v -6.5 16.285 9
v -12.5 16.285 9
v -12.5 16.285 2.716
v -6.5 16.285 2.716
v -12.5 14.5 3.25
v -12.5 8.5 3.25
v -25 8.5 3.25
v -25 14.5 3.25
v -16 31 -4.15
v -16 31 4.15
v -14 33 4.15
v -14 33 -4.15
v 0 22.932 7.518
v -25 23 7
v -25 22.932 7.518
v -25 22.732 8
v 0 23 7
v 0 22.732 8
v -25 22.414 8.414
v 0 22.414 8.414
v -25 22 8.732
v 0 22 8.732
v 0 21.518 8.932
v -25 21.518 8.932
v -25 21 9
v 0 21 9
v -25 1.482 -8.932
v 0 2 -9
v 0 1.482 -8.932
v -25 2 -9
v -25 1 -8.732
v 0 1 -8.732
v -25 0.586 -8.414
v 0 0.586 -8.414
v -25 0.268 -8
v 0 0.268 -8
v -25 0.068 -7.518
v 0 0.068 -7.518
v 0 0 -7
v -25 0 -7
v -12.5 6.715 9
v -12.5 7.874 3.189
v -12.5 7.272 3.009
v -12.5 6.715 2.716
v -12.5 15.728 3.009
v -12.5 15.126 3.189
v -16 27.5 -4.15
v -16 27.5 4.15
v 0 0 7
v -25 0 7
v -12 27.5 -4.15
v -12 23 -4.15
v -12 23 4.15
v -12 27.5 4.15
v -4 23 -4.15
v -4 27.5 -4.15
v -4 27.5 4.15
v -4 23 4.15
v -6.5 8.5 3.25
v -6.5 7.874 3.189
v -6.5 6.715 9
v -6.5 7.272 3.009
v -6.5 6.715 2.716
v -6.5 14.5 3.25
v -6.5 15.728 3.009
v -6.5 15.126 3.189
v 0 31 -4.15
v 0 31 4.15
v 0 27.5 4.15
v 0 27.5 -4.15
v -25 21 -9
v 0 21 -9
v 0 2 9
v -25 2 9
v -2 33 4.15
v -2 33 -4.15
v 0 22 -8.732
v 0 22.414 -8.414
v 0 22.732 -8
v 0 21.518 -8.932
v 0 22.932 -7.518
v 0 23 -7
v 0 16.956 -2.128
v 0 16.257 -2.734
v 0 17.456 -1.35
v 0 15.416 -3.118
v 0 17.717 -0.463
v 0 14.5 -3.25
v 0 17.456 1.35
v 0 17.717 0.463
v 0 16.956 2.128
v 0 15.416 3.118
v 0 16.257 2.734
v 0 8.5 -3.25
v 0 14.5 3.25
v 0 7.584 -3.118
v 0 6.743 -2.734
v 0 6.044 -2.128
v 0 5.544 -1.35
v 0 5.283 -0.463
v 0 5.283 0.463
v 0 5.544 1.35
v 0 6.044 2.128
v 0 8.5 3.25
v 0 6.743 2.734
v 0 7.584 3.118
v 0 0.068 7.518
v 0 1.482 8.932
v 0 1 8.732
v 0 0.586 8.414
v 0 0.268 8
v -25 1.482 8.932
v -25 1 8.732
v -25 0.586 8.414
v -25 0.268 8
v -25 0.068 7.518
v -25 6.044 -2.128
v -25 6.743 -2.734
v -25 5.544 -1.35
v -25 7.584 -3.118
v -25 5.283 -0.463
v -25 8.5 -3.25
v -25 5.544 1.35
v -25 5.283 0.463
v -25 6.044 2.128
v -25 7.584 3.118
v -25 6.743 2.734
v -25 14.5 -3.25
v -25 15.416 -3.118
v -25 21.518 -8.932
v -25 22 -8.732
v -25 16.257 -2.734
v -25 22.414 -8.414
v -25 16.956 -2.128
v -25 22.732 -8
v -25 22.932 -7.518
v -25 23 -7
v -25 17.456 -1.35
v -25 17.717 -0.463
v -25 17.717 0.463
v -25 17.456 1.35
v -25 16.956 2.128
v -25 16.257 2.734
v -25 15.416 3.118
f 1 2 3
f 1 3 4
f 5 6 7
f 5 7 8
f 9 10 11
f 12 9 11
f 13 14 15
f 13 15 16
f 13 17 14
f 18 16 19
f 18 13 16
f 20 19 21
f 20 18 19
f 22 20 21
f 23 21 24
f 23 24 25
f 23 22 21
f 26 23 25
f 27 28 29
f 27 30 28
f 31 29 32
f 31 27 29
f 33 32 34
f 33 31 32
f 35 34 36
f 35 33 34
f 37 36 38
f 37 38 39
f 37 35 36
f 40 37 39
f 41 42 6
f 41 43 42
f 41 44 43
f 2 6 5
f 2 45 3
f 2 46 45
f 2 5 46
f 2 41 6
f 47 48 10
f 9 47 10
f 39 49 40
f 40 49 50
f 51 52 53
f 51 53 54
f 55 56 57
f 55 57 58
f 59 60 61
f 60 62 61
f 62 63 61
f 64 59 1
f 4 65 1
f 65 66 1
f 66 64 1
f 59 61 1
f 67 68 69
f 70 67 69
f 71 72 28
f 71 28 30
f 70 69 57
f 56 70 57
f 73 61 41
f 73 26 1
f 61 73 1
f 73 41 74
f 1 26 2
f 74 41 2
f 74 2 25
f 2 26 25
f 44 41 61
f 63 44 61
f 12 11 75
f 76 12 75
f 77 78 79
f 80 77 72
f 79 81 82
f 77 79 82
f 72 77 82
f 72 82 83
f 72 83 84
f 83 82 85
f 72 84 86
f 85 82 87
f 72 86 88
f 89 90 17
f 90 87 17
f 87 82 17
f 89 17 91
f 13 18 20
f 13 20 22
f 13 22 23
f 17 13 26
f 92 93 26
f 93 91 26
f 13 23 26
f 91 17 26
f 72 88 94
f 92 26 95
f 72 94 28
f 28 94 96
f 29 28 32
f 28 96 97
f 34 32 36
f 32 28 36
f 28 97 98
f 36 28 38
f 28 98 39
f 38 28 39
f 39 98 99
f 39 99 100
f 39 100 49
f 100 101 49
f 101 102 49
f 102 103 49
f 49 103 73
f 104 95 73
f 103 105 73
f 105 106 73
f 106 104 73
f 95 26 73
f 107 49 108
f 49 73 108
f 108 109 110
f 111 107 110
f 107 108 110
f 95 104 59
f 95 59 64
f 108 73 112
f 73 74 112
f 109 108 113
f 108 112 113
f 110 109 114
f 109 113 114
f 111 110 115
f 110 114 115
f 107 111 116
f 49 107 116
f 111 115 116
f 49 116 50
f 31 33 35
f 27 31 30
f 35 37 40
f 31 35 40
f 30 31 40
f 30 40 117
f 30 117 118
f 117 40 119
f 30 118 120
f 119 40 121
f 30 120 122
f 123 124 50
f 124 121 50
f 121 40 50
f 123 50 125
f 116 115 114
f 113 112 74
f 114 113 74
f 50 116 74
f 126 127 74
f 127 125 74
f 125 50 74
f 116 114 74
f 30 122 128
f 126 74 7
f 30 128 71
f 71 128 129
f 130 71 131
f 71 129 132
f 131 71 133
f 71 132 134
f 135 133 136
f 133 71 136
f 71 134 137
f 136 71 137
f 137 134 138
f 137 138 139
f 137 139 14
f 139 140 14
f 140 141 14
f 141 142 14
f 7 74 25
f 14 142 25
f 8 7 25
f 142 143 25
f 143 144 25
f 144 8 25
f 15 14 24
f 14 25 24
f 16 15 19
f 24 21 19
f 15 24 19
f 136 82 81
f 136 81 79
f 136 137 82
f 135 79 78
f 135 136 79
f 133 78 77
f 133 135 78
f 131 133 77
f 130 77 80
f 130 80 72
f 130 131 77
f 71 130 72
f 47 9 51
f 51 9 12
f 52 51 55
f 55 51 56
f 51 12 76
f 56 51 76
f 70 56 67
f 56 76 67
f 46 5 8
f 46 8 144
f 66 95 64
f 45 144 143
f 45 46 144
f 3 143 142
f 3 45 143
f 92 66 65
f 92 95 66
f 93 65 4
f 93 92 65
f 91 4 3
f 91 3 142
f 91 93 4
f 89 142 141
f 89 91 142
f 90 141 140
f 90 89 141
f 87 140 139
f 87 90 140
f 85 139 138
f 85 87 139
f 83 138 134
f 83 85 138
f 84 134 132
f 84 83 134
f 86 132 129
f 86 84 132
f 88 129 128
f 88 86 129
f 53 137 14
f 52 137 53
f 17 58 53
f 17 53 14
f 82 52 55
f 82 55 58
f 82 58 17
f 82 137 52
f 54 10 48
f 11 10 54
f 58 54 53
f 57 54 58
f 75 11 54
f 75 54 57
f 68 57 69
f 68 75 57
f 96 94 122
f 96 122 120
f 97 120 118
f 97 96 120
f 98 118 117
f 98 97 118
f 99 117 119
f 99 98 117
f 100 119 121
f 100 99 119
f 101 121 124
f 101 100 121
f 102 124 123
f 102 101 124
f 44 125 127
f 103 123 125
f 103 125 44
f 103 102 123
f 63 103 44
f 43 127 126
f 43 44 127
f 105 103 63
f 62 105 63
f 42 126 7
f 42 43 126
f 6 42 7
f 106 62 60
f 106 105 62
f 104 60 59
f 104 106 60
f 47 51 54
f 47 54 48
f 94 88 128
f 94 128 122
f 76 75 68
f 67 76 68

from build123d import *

# Parameters (mm, degrees)
EXTRUDE_1_DEPTH     = 9
CUT_EXTRUDE_1_REACH = 44.367
SKETCH_3_W          = 19.10949688
SKETCH_3_H          = 7.850581447
SKETCH_3_W_2        = 21.646823843
SKETCH_3_H_2        = 9.928676536
CUT_EXTRUDE_2_DEPTH = 43.367440329
SKETCH_5_W          = 6
SKETCH_5_H          = 9.57
CUT_EXTRUDE_3_DEPTH = 10
FILLET_1_R          = 2


with BuildPart() as part:
    # 草图1 → 凸台-拉伸1 (new, symmetric)
    with BuildSketch(Plane.XY):
        Polygon((-14, 33), (-2, 33), (0, 31), (0, 27.5), (-4, 27.5), (-4, 23), (0, 23), (0, 0), (-25, 0), (-25, 23), (-12, 23), (-12, 27.5), (-16, 27.5), (-16, 31), align=None)
    extrude(amount=EXTRUDE_1_DEPTH, both=True)

    # 切除-拉伸1: up to this face of the body (flat: up to its plane)
    cut_extrude_1_end = Plane(part.part.faces().sort_by_distance((-18.5, 23, 0))[0])
    # 草图3 → 切除-拉伸1 (cut, up to the picked face)
    with BuildSketch(Plane(origin=(0, 33, 0), x_dir=(1, 0, 0), z_dir=(0, 1, 0)), mode=Mode.PRIVATE) as cut_extrude_1_sk1:
        with Locations((-9.55474844, 8.075290724)):
            Rectangle(SKETCH_3_W, SKETCH_3_H)
    cut_extrude_1_tool1 = split(extrude(cut_extrude_1_sk1.sketch, amount=-CUT_EXTRUDE_1_REACH, mode=Mode.PRIVATE), bisect_by=cut_extrude_1_end, keep=Keep.BOTH, mode=Mode.PRIVATE)
    # 草图3 → 切除-拉伸1 (cut, up to the picked face)
    with BuildSketch(Plane(origin=(0, 33, 0), x_dir=(1, 0, 0), z_dir=(0, 1, 0)), mode=Mode.PRIVATE) as cut_extrude_1_sk2:
        with Locations((-8.286084959, -9.114338268)):
            Rectangle(SKETCH_3_W_2, SKETCH_3_H_2)
    cut_extrude_1_tool2 = split(extrude(cut_extrude_1_sk2.sketch, amount=-CUT_EXTRUDE_1_REACH, mode=Mode.PRIVATE), bisect_by=cut_extrude_1_end, keep=Keep.BOTH, mode=Mode.PRIVATE)
    add(cut_extrude_1_tool1.solids().sort_by(Axis((-9.554748, 33, -8.075291), (0, -1, 0)))[0], mode=Mode.SUBTRACT)
    add(cut_extrude_1_tool2.solids().sort_by(Axis((-8.286085, 33, 9.114338), (0, -1, 0)))[0], mode=Mode.SUBTRACT)

    # 草图4 → 切除-拉伸2 (cut, through all)
    with BuildSketch(Plane(origin=(0, 0, 0), x_dir=(0, 0, -1), z_dir=(1, 0, 0))):
        with BuildLine():
            Line((-3.25, 8.5), (-3.25, 14.5))
            ThreePointArc((-3.25, 14.5), (0, 17.75), (3.25, 14.5))
            Line((3.25, 14.5), (3.25, 8.5))
            ThreePointArc((3.25, 8.5), (0, 5.25), (-3.25, 8.5))
        make_face()
    extrude(amount=-CUT_EXTRUDE_2_DEPTH, mode=Mode.SUBTRACT)

    # 草图5 → 切除-拉伸3 (cut)
    with BuildSketch(Plane.XY.offset(9)):
        with Locations((-9.5, 11.5)):
            Rectangle(SKETCH_5_W, SKETCH_5_H)
    extrude(amount=-CUT_EXTRUDE_3_DEPTH, mode=Mode.SUBTRACT)

    # 圆角1
    fillet_1_edges = [part.edges().sort_by_distance(p)[0] for p in [
        (-12.5, 23, -9),
        (-12.5, 0, -9),
        (-12.5, 23, 9),
        (-12.5, 0, 9),
    ]]
    fillet(fillet_1_edges, radius=FILLET_1_R)


solid = part.part
